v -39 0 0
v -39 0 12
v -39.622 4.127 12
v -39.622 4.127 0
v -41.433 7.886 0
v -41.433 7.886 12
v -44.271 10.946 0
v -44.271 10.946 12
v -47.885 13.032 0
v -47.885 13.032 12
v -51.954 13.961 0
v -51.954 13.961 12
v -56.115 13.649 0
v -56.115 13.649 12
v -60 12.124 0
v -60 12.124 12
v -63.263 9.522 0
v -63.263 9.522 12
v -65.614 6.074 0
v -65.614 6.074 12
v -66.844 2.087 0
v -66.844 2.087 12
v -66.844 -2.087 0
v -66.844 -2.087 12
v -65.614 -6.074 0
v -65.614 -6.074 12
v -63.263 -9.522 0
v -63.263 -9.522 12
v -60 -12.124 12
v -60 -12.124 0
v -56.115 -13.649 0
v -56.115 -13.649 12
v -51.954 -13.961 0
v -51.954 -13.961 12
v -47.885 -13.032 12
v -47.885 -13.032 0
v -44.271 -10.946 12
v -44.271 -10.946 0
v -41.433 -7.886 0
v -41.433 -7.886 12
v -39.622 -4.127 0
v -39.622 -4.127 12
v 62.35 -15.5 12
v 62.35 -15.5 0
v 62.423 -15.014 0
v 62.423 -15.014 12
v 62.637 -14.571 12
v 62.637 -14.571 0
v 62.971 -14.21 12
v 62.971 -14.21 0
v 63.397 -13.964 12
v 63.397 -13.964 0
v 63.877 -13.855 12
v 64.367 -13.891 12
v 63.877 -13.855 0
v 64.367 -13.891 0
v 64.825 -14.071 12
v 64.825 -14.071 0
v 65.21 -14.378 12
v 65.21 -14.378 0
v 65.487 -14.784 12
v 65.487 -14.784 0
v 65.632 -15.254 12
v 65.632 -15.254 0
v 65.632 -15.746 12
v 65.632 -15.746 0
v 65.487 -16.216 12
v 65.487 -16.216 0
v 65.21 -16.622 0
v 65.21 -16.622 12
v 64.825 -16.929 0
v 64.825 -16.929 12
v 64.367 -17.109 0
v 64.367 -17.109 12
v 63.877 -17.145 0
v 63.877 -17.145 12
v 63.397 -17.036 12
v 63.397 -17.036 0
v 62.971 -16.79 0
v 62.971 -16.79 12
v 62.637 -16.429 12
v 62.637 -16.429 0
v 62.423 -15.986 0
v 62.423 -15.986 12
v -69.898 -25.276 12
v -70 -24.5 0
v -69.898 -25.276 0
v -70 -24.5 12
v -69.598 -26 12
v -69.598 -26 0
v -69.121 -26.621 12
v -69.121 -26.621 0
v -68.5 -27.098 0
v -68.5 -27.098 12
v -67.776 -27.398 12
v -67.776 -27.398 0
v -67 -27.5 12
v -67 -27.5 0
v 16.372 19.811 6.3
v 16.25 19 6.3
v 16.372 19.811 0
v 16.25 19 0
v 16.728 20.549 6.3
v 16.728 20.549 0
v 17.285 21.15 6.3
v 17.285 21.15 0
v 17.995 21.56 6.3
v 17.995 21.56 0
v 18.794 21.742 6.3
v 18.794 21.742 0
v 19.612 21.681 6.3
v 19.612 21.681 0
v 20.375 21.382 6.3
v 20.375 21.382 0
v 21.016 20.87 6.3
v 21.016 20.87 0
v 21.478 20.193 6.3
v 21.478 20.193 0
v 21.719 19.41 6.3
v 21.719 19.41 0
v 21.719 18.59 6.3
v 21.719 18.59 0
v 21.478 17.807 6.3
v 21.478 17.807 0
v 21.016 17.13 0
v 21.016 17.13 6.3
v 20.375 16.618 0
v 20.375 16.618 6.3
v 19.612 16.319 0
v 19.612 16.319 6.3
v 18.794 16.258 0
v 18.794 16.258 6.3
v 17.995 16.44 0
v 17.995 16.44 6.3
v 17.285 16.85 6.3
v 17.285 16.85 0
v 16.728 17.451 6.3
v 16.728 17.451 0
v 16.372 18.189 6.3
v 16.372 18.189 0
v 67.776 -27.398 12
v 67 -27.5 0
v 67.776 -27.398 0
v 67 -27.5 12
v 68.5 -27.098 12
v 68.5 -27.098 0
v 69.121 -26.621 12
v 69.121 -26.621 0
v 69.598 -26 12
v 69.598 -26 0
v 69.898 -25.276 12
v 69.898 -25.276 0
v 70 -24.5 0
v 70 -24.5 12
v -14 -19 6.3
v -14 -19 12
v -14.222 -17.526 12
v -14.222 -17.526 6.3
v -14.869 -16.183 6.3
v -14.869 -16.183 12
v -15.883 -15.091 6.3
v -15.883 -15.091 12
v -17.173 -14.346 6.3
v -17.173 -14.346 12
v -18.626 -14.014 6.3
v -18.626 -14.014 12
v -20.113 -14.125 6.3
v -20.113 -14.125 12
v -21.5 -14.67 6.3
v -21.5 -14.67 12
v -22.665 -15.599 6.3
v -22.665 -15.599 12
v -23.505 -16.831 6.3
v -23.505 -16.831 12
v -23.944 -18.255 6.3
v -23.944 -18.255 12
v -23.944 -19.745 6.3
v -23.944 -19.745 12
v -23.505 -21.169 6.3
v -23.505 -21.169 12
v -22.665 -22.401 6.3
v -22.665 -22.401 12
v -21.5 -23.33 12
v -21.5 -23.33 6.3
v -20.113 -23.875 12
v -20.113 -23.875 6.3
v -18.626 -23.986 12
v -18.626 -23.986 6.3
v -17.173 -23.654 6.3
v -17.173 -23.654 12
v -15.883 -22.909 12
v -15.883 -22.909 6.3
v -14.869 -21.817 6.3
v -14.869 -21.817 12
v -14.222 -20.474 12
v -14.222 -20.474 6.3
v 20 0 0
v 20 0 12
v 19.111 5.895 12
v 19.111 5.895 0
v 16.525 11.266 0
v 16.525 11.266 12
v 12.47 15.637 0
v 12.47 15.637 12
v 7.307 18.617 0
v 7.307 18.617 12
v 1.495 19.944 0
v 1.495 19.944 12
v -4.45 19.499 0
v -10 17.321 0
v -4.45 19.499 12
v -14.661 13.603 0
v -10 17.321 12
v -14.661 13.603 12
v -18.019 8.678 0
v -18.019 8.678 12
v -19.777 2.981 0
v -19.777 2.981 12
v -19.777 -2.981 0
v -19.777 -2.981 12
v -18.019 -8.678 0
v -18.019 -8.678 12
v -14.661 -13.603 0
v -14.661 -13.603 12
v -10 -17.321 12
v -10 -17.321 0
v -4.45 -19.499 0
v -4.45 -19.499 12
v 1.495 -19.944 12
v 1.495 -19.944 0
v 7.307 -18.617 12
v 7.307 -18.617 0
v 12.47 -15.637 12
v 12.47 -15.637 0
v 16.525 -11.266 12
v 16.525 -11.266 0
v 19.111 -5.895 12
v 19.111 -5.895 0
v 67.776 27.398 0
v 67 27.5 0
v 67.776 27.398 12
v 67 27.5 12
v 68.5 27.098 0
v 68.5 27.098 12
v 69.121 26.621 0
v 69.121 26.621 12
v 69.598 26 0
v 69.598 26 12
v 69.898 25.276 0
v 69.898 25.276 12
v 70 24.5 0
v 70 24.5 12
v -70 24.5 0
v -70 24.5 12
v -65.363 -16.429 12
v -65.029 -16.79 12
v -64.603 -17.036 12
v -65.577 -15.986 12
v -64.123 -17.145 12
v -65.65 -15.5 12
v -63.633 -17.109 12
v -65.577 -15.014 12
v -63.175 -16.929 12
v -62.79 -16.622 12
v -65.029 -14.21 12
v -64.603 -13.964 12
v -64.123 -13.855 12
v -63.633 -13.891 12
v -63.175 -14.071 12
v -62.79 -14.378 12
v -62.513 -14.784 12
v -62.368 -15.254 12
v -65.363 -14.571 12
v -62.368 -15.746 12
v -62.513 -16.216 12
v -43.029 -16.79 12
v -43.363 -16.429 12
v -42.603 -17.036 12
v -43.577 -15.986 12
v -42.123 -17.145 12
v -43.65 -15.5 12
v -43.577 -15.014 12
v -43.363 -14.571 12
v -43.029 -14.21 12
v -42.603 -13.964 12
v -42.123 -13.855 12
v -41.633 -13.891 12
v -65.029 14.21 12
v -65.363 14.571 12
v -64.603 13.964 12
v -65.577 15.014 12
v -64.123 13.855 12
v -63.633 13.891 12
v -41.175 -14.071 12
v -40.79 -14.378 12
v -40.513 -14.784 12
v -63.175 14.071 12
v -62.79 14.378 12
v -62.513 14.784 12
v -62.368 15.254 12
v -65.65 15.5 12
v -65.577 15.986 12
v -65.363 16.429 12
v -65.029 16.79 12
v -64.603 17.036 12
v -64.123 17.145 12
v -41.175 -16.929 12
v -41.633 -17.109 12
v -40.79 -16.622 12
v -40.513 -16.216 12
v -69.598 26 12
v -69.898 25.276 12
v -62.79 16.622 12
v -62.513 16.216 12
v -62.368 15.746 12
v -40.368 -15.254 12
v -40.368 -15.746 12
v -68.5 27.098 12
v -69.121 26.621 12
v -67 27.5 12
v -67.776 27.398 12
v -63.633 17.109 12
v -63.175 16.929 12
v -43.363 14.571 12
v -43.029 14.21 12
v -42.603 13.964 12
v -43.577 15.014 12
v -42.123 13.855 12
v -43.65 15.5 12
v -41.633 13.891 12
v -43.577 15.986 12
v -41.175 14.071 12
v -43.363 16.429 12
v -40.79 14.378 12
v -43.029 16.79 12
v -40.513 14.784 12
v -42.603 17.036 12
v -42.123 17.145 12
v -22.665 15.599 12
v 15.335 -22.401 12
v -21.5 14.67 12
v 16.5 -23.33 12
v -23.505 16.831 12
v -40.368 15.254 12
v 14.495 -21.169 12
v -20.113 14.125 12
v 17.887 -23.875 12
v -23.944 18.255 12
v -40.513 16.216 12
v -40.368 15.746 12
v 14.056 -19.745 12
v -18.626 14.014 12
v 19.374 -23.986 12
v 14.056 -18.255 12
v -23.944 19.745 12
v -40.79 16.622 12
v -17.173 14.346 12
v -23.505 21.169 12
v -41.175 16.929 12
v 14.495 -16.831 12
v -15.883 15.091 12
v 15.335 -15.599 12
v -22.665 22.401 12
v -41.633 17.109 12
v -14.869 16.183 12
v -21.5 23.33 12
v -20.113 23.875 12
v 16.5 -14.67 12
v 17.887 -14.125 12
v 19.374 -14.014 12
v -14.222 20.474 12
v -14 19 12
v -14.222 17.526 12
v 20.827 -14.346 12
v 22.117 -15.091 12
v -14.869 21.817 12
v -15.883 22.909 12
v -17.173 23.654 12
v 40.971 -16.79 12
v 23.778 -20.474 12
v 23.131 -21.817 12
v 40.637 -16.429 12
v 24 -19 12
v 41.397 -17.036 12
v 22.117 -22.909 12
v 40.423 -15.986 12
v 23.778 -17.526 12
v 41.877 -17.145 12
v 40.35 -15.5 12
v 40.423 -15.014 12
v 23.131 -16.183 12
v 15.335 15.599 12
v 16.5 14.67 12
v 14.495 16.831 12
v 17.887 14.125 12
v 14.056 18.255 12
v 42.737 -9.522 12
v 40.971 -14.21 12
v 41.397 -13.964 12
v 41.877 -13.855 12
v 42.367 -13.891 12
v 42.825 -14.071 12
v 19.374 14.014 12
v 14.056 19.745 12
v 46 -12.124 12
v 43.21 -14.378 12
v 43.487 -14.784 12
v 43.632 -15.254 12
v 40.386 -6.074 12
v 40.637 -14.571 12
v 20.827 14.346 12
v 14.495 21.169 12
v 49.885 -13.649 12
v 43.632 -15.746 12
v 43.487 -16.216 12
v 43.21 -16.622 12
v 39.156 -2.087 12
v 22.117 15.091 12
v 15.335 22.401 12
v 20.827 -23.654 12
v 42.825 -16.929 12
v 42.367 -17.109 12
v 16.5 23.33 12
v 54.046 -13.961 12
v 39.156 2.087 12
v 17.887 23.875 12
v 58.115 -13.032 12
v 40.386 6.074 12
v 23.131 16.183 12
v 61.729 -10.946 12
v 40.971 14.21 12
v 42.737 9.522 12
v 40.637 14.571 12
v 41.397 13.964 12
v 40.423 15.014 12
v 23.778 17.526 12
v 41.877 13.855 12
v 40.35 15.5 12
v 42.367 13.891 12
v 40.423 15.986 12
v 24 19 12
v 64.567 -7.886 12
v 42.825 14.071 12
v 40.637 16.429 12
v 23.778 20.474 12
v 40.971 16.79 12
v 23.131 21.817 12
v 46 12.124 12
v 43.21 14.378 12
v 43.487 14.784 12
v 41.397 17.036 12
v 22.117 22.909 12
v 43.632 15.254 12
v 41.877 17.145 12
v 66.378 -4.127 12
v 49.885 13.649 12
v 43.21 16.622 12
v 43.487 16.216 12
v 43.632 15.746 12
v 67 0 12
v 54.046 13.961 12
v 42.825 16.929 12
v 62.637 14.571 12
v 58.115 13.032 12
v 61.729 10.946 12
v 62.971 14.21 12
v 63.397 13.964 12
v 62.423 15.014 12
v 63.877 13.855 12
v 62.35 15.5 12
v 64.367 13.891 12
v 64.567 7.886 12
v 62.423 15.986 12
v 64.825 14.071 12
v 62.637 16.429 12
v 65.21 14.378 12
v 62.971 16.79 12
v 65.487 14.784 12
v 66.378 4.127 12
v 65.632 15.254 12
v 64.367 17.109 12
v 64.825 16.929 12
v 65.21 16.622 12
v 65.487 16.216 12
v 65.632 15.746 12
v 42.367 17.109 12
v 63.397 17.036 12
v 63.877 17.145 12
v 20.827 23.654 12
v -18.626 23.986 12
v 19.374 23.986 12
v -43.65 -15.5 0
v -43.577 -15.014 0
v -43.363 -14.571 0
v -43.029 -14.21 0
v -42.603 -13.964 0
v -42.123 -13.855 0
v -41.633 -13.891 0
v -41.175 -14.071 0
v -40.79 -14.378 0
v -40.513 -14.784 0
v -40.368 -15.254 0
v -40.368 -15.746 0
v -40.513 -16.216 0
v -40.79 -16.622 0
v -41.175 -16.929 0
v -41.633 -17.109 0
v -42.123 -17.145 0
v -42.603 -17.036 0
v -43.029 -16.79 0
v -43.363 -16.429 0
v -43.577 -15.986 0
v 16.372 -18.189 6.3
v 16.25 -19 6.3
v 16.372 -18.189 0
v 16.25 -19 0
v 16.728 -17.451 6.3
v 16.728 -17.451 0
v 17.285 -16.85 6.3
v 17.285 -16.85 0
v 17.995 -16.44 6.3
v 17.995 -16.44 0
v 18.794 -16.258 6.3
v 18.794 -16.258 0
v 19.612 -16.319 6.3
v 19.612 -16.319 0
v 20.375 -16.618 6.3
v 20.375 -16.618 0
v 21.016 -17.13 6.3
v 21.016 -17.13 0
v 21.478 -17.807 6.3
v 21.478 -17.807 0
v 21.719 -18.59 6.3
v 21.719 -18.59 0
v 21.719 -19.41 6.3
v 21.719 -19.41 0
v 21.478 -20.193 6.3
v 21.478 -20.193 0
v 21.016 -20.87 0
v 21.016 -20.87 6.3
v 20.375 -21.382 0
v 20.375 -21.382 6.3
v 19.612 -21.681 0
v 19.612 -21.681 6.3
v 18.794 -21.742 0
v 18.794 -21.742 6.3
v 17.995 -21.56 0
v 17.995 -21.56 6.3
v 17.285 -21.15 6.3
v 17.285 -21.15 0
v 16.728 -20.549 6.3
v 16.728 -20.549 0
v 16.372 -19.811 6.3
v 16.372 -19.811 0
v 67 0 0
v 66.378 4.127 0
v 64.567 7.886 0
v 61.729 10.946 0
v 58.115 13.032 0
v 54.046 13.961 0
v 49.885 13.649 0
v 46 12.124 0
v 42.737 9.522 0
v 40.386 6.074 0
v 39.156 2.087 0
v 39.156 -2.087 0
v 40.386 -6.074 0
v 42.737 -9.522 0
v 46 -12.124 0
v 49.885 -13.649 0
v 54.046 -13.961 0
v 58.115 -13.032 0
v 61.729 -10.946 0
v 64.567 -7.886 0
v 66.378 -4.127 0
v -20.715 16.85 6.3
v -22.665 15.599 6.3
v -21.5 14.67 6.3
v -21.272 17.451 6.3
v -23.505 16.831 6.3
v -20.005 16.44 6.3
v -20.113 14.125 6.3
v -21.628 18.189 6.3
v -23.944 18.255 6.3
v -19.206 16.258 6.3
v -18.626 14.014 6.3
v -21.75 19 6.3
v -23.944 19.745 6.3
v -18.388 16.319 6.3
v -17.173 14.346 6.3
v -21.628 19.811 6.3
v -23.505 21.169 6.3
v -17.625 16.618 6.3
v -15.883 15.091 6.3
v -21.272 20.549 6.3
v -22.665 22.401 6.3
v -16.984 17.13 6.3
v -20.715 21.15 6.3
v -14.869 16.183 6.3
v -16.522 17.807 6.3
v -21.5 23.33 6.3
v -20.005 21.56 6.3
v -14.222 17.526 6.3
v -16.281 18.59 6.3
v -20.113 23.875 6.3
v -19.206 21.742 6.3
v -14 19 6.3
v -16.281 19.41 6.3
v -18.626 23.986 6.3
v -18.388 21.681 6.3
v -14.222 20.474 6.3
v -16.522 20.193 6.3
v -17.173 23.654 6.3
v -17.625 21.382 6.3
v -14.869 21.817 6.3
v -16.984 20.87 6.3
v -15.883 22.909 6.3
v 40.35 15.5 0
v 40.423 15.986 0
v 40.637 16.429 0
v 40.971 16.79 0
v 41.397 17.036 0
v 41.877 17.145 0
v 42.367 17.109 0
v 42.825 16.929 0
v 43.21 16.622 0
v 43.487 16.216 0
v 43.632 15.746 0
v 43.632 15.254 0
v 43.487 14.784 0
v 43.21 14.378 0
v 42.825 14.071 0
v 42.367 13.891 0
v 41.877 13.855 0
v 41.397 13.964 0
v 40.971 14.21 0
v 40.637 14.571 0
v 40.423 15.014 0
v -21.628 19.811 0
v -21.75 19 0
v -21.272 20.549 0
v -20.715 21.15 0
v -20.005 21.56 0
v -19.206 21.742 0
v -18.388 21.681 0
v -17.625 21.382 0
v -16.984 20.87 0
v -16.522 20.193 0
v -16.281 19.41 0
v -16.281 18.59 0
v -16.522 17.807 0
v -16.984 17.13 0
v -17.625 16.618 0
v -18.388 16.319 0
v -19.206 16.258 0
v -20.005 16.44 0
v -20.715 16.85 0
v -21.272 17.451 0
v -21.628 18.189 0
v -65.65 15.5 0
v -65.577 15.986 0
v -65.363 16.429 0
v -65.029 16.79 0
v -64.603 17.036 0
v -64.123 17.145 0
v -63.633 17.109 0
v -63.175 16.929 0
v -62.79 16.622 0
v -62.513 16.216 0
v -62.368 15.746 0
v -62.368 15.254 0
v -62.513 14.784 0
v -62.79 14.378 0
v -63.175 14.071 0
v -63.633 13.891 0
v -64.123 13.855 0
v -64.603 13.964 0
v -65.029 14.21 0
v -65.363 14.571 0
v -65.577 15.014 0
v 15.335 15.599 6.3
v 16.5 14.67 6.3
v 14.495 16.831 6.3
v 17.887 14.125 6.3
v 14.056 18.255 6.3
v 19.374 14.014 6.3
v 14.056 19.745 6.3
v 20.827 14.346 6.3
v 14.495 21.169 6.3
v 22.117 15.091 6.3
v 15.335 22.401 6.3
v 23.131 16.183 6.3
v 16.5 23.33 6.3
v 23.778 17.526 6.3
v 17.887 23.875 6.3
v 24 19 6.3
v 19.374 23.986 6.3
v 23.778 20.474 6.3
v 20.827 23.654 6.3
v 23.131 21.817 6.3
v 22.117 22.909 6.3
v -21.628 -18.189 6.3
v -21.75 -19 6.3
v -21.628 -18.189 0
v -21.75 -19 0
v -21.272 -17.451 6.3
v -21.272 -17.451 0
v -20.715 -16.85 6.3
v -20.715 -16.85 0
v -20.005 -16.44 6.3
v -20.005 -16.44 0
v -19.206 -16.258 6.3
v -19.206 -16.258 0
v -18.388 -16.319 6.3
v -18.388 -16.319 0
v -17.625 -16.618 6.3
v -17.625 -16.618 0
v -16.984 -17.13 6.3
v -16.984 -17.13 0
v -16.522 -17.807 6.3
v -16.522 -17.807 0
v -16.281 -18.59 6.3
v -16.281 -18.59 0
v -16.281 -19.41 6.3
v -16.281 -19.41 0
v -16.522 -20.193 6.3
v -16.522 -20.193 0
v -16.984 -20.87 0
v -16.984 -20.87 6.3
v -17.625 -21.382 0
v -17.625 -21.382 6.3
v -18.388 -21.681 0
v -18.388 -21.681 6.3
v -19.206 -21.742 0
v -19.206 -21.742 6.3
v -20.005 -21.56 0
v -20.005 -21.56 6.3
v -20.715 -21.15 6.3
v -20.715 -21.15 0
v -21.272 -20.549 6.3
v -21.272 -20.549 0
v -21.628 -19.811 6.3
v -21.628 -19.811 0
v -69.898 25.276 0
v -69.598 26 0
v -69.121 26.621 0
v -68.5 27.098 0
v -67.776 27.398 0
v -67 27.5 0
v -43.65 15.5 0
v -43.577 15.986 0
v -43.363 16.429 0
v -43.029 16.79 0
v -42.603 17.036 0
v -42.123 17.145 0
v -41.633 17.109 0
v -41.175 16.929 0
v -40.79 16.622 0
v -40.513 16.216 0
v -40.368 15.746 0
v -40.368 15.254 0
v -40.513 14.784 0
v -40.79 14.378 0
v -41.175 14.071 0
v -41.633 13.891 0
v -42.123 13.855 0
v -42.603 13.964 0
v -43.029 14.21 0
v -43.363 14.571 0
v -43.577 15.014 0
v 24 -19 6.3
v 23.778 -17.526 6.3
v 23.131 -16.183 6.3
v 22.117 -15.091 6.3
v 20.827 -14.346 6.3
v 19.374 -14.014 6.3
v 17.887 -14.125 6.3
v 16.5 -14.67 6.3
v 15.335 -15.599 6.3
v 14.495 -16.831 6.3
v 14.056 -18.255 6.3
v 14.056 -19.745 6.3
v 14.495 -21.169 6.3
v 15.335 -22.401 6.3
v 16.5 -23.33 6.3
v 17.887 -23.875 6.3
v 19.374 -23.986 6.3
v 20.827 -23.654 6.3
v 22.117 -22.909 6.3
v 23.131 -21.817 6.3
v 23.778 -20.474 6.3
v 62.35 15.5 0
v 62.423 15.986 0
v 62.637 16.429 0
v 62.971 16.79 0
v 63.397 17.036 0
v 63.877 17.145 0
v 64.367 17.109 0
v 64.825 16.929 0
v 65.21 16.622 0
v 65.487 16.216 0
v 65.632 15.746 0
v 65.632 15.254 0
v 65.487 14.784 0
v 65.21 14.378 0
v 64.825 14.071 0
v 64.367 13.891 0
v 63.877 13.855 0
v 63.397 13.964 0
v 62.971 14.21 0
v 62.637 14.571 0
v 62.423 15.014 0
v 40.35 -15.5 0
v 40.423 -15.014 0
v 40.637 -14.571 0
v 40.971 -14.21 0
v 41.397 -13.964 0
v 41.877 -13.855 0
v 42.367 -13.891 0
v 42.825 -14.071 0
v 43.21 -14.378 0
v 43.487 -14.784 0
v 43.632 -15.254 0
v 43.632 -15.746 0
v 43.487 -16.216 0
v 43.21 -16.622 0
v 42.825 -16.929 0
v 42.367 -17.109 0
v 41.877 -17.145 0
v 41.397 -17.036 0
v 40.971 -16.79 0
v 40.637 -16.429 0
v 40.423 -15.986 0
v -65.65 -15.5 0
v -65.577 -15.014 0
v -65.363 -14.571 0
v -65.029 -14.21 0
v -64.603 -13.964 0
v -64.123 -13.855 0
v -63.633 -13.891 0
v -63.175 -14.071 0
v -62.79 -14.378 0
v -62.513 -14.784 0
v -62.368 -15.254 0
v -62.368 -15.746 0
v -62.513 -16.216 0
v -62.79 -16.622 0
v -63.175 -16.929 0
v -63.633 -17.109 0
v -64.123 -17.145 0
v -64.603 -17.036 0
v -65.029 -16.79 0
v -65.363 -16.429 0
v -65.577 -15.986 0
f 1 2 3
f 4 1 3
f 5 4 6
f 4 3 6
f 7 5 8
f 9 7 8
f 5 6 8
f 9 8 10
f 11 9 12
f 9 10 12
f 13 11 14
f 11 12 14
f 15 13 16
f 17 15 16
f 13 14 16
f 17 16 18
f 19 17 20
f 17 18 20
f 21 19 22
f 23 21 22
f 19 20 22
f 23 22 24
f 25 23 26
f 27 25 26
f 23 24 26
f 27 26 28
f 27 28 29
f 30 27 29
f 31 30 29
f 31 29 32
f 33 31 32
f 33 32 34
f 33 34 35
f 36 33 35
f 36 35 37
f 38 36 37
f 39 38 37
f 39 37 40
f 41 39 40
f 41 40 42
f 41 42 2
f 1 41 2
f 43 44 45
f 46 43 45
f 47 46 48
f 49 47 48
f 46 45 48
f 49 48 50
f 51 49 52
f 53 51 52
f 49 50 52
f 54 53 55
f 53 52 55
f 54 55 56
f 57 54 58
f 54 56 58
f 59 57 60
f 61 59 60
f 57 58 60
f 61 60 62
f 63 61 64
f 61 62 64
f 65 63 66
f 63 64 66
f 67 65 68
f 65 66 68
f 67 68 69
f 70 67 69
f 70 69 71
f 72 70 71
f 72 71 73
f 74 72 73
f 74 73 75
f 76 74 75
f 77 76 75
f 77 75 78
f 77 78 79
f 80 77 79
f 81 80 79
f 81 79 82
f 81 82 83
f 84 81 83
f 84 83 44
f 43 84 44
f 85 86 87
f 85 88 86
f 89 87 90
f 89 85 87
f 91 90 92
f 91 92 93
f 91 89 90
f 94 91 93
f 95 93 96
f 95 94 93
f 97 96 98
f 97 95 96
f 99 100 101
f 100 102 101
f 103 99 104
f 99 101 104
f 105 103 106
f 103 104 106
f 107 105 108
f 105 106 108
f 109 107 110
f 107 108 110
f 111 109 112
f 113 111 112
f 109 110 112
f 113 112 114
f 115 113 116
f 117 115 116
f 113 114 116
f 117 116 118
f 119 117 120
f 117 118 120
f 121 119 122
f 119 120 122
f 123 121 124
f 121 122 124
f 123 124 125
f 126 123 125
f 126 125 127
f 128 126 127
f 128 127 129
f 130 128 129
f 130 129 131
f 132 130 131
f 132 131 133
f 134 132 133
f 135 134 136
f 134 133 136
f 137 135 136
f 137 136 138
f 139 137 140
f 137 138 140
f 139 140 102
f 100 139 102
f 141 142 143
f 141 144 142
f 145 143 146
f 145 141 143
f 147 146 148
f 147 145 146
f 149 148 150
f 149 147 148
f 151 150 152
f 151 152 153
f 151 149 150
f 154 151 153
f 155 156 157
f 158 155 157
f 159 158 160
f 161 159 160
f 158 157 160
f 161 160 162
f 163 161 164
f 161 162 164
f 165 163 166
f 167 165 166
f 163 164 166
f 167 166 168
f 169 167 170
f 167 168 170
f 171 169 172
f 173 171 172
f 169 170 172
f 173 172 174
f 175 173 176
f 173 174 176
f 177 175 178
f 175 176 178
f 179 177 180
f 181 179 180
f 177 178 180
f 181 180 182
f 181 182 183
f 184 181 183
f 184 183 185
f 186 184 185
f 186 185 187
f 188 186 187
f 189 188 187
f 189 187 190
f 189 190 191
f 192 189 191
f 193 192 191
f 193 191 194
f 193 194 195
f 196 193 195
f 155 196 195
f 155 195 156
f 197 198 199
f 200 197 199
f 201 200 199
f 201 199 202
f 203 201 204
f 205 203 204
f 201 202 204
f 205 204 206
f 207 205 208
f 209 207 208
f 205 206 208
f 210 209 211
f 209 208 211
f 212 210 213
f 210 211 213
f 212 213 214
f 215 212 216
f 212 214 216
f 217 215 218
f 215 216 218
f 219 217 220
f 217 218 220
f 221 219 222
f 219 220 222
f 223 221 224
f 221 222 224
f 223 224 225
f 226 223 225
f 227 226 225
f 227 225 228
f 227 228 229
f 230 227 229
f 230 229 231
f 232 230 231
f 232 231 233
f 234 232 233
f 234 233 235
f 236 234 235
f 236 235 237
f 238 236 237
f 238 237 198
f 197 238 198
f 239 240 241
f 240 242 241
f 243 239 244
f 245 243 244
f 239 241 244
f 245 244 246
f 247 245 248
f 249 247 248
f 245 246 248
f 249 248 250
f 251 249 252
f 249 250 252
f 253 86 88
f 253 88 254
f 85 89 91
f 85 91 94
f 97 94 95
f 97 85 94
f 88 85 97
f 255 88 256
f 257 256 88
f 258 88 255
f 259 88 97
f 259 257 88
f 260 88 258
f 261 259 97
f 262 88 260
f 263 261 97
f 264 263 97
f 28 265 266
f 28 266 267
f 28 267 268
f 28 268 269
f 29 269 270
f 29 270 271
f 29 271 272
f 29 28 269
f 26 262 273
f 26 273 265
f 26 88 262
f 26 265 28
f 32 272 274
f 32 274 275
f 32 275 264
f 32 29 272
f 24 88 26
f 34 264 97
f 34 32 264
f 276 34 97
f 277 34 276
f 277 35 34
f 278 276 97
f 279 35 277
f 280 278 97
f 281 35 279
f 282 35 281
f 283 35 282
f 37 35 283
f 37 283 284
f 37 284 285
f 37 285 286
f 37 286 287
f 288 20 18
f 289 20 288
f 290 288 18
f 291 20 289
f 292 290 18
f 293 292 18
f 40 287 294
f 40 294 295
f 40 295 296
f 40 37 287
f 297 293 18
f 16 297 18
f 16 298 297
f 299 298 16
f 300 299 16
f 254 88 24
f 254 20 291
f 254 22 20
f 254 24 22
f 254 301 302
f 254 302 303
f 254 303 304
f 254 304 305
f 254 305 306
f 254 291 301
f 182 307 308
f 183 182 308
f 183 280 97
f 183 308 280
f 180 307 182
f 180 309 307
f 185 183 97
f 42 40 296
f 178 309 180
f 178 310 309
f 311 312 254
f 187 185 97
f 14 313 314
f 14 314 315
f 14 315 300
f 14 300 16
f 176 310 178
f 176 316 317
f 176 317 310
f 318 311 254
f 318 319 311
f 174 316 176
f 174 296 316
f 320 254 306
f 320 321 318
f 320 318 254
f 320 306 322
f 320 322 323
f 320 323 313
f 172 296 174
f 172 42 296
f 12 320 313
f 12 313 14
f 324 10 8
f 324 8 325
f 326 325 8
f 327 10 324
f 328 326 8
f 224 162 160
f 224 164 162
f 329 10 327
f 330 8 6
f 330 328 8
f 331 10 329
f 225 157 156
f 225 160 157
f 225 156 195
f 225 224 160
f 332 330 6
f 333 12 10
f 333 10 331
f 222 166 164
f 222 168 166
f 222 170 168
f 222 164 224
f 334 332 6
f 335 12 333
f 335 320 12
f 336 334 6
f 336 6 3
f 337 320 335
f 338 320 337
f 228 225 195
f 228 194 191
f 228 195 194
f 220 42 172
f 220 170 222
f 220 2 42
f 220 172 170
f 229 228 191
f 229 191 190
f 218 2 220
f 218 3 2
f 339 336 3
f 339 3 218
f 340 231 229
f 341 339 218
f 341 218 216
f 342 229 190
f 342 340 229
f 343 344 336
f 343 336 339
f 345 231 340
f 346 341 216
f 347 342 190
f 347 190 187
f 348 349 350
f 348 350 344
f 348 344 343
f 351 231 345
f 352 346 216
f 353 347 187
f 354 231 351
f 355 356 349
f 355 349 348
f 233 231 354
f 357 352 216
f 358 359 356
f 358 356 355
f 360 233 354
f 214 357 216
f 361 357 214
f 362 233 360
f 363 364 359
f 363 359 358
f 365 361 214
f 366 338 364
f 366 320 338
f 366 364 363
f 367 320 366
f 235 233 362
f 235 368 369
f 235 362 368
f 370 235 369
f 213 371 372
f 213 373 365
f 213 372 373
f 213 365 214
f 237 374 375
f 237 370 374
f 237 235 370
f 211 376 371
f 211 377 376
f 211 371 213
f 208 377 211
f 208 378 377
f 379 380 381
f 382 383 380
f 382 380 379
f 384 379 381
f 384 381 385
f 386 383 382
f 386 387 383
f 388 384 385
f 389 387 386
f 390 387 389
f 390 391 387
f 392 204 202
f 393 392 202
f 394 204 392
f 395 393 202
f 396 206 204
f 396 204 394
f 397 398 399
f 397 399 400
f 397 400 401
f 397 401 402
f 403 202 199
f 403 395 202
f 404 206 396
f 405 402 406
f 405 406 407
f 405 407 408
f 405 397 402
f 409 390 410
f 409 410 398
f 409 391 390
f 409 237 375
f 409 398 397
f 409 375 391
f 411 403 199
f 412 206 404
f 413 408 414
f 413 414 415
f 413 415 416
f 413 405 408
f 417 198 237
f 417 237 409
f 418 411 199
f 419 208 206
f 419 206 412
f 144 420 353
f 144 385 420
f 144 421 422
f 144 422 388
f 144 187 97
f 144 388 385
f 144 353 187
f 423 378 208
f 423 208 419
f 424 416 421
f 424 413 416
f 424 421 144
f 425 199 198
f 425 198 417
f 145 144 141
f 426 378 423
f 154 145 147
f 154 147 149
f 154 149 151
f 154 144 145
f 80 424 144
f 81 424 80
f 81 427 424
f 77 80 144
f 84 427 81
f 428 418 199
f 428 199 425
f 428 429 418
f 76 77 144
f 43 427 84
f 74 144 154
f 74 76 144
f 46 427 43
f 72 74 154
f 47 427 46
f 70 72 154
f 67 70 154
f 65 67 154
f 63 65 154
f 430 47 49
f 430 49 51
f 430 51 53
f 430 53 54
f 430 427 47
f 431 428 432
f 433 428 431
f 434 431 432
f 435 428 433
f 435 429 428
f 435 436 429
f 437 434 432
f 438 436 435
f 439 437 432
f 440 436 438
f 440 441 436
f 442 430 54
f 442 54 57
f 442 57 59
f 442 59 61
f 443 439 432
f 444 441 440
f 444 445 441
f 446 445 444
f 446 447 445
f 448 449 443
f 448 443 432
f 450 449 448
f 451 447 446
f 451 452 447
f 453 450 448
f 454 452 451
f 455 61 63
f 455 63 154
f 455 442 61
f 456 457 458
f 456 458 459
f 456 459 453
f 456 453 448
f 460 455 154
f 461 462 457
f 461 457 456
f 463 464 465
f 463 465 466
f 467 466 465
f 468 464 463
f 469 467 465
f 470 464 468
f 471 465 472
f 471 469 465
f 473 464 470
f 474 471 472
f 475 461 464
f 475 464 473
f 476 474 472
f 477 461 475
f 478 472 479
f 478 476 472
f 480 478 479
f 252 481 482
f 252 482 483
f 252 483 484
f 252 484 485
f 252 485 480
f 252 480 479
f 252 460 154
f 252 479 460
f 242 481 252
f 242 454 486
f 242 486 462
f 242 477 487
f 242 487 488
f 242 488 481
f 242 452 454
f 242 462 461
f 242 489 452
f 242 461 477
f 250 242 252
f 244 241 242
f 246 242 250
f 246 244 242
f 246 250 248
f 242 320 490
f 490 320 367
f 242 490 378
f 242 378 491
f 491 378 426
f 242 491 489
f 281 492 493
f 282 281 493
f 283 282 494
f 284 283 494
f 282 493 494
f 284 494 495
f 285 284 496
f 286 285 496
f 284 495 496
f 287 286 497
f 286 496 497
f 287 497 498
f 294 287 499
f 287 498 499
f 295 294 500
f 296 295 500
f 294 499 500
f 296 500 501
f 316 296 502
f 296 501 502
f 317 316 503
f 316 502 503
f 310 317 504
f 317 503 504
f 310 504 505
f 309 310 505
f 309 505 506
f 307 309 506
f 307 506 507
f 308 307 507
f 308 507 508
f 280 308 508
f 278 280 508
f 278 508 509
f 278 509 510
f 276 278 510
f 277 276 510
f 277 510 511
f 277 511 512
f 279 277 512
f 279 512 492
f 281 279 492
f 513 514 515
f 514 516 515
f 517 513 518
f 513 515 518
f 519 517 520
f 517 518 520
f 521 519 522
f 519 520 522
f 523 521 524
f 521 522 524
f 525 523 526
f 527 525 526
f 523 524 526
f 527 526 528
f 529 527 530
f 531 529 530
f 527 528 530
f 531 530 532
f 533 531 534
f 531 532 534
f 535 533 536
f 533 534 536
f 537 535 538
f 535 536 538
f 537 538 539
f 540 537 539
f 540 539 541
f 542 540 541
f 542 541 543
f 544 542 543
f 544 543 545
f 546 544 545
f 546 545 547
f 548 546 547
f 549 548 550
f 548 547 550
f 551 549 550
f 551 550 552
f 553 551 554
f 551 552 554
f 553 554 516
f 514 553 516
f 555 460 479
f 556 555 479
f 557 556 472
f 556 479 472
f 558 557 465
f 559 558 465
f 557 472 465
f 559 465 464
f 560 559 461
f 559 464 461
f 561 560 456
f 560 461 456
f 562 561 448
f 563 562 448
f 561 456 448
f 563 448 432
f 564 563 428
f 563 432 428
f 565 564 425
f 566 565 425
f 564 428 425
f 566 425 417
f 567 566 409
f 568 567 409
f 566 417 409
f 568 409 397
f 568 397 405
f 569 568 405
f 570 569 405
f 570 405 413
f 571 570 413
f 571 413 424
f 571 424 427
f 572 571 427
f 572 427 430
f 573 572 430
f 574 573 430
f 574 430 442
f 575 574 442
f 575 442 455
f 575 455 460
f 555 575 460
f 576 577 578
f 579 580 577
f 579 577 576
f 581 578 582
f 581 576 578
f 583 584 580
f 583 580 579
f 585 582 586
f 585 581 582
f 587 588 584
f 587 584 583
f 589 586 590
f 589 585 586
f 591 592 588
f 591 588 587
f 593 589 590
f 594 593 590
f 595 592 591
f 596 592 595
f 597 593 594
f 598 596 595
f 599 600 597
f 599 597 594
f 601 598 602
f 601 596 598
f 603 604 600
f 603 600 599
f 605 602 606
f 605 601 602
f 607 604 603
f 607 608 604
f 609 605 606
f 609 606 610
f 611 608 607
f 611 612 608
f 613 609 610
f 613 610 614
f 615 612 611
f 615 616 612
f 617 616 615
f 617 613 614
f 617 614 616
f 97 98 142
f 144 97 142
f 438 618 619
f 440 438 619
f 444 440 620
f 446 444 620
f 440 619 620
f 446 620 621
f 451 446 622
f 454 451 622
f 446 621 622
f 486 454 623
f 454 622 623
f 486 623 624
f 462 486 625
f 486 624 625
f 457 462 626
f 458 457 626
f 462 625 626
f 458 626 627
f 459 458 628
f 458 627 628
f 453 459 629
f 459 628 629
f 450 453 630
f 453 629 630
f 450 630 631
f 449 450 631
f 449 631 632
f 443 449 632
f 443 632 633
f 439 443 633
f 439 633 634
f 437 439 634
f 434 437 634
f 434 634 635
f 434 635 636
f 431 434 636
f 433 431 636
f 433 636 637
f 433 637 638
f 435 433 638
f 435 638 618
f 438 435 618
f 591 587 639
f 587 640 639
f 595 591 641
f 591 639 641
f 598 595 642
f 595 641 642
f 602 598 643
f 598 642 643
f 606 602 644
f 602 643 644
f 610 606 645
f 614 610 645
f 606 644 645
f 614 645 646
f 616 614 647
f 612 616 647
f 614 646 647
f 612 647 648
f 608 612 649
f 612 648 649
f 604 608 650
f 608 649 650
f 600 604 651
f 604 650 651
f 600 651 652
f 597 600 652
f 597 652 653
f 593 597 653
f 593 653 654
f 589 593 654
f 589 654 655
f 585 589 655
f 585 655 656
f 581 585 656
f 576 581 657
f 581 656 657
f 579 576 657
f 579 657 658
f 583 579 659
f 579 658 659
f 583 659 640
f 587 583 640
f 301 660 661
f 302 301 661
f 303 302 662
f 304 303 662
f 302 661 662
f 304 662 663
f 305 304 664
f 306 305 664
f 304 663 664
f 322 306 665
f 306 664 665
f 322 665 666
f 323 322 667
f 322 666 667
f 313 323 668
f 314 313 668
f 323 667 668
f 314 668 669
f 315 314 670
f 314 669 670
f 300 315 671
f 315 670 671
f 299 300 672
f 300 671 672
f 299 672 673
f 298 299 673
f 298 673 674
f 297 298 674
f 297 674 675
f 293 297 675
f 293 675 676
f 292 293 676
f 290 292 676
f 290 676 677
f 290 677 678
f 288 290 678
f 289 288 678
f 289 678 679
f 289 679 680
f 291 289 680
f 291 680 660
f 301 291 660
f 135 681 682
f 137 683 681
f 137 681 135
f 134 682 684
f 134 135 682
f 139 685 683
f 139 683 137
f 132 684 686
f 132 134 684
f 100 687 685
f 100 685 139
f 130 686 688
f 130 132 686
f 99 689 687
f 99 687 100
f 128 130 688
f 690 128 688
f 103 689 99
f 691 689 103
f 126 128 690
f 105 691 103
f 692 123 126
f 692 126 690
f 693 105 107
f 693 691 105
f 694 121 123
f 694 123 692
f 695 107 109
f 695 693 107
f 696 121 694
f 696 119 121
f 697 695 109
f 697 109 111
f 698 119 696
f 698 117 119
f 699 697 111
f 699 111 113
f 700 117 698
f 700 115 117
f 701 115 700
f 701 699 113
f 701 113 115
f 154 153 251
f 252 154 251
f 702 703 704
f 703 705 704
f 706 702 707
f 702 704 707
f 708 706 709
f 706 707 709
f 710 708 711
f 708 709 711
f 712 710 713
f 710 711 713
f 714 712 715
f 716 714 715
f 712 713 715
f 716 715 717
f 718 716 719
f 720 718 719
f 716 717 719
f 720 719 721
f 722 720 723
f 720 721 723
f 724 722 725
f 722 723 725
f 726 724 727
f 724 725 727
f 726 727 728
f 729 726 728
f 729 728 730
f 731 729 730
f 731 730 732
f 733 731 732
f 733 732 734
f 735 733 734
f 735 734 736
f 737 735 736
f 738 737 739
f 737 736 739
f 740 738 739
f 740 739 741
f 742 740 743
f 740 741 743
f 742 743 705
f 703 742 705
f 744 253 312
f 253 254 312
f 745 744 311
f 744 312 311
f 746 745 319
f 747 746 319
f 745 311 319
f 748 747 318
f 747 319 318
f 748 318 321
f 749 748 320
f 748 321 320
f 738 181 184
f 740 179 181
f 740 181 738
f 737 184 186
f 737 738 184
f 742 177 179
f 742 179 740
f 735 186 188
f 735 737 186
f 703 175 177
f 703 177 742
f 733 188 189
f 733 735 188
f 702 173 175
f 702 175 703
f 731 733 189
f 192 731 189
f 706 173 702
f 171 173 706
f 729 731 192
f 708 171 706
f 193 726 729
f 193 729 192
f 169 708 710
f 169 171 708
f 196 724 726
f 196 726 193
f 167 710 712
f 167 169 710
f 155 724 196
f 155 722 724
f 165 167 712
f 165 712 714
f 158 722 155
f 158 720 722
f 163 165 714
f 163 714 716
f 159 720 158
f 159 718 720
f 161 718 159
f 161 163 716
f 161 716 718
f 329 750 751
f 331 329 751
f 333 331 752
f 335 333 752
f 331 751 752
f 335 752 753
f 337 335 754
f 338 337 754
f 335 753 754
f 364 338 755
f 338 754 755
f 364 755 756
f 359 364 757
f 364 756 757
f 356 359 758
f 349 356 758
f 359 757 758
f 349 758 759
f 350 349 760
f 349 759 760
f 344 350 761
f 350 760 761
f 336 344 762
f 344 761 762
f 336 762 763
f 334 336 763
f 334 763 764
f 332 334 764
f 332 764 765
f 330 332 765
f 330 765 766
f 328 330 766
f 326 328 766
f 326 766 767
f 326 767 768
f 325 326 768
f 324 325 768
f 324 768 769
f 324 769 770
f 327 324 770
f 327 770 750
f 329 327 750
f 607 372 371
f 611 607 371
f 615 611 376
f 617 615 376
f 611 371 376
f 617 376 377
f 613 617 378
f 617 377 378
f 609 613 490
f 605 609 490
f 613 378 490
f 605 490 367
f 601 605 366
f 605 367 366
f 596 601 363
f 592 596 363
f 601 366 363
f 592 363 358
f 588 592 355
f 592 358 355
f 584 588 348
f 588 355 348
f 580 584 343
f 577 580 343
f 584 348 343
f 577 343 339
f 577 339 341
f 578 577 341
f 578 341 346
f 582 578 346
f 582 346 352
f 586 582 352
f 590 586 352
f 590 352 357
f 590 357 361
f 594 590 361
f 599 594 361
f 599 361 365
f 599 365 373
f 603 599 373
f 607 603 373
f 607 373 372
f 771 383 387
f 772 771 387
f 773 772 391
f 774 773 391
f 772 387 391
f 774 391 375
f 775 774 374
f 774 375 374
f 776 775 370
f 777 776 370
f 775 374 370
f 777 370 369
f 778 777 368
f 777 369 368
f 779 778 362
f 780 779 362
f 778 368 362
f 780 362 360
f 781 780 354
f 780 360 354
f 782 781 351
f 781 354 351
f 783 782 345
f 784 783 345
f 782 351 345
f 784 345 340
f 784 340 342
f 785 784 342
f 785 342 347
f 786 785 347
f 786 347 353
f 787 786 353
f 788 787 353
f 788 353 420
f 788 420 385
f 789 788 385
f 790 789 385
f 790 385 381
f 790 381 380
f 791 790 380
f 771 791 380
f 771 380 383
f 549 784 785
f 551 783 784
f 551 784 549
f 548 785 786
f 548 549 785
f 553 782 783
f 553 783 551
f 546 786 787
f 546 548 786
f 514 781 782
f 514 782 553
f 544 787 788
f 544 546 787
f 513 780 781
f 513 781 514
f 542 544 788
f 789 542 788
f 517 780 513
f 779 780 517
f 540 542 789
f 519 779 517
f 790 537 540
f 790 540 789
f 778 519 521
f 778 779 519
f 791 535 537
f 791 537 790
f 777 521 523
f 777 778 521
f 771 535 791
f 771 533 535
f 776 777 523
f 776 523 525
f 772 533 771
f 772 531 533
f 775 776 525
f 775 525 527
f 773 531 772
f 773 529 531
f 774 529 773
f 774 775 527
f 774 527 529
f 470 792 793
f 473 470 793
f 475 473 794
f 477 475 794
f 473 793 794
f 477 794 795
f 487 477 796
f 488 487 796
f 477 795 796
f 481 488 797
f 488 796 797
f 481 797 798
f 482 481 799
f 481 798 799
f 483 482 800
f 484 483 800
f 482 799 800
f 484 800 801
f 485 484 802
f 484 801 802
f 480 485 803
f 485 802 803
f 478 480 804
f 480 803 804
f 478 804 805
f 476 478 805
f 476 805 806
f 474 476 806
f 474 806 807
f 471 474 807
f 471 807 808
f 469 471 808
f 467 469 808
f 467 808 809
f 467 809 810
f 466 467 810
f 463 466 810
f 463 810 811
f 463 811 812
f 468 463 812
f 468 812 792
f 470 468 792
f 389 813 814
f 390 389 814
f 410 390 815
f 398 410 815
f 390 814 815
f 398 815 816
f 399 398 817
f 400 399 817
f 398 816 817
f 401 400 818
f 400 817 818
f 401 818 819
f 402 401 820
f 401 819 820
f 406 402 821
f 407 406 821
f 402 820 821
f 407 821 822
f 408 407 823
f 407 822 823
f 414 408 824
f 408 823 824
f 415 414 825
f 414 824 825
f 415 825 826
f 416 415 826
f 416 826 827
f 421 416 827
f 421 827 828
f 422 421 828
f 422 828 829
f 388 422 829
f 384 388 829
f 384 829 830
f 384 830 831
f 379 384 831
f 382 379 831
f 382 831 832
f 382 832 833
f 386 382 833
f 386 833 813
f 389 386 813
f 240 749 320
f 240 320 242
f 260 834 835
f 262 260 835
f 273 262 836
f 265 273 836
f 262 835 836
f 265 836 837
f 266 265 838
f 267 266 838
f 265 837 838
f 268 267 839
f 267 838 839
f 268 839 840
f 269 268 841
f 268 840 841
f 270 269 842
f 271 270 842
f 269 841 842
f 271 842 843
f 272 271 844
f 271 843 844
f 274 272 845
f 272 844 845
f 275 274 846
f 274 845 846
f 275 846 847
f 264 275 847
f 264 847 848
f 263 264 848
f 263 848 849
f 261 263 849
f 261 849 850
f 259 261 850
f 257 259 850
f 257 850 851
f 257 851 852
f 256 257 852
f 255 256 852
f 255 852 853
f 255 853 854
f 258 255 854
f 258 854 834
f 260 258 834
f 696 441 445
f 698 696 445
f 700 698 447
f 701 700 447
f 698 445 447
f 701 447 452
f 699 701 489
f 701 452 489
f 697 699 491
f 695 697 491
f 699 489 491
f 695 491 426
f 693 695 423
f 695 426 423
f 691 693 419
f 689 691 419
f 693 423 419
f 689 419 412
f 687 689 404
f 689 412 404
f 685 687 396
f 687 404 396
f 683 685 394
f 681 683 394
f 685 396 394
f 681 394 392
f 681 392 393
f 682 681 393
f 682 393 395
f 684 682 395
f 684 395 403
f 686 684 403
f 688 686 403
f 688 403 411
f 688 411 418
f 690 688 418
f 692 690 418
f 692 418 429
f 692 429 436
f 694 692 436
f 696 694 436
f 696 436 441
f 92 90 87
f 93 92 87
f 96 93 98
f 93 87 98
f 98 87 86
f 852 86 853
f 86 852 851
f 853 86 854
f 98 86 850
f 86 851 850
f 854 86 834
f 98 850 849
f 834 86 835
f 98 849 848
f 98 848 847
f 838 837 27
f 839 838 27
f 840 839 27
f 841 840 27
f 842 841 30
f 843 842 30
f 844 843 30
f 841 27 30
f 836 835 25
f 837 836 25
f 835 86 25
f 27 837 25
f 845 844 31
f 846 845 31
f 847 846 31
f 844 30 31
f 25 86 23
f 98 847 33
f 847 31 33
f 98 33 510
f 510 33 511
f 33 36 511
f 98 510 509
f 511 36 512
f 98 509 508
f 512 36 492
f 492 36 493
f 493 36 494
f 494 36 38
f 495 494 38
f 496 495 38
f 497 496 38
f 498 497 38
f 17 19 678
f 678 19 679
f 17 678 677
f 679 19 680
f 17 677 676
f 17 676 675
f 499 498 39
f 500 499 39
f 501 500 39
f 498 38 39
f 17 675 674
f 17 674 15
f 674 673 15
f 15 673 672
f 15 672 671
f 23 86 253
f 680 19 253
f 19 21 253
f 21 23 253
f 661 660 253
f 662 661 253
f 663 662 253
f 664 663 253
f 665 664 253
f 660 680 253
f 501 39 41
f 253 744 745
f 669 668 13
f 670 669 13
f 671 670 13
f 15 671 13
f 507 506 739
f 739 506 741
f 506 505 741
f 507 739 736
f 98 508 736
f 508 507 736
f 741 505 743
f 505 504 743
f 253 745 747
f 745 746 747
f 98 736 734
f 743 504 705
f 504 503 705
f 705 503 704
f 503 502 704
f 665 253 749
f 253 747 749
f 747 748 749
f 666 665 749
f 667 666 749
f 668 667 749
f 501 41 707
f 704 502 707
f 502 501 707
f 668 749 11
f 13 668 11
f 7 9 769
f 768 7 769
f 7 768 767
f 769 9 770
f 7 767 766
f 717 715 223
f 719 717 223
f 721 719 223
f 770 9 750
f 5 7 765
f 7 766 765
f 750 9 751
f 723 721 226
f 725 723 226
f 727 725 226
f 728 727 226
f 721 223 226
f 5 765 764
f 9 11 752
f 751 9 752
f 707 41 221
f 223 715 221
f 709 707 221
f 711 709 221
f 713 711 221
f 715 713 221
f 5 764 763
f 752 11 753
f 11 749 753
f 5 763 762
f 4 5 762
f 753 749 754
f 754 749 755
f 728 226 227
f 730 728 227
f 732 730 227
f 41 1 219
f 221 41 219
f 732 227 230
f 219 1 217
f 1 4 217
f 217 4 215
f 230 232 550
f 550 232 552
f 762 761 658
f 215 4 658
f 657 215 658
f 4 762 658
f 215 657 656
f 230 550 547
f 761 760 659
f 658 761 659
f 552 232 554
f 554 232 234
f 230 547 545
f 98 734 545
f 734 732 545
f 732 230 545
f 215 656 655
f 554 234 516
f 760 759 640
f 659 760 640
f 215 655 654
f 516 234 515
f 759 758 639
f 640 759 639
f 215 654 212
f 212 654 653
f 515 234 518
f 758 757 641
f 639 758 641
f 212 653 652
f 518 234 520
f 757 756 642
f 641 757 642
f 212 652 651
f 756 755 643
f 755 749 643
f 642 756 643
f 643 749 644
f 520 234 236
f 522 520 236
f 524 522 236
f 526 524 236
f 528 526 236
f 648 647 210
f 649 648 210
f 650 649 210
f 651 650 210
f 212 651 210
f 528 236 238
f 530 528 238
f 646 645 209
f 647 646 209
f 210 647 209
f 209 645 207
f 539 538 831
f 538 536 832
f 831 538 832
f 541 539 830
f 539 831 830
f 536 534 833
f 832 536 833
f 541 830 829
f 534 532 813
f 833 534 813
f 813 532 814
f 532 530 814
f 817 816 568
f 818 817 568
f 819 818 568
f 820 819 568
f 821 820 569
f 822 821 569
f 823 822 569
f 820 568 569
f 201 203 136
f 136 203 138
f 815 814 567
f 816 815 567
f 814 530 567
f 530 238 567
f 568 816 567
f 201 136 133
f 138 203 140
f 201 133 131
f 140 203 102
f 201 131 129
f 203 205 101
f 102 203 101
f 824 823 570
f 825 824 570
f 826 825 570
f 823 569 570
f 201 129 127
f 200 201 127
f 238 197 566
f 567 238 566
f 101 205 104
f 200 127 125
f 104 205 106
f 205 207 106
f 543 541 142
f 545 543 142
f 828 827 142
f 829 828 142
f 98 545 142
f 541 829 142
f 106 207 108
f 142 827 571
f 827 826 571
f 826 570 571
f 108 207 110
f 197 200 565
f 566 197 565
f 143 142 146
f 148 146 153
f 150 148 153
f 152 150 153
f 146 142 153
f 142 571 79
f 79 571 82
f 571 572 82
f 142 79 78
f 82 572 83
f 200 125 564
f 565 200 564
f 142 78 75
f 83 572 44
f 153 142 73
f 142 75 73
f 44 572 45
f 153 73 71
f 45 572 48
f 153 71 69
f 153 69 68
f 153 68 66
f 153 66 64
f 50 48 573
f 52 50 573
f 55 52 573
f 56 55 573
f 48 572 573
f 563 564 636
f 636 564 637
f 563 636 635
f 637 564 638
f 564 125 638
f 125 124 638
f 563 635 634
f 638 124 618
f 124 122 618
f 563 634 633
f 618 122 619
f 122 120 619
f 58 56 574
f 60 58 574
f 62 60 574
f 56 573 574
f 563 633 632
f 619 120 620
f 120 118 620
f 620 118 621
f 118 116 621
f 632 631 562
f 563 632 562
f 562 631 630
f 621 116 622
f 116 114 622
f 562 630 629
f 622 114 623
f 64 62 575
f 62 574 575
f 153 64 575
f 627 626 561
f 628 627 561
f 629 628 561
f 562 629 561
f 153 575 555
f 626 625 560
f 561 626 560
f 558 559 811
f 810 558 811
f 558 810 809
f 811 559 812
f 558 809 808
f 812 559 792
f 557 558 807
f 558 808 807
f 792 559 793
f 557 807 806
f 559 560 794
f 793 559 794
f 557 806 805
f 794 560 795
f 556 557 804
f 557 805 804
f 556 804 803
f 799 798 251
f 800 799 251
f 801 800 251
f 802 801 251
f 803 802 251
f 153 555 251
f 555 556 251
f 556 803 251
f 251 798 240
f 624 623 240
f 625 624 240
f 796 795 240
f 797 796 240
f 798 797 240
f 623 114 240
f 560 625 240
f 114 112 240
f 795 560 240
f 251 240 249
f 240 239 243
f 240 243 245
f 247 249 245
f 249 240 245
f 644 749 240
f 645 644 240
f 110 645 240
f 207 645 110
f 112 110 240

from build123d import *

# Parameters (mm, degrees)
SKETCH_1_W                = 140
SKETCH_1_H                = 55
EXTRUDE_1_DEPTH           = 12
SKETCH_2_R                = 20
SKETCH_2_R_2              = 14
CUT_EXTRUDE_1_DEPTH       = 77.159372371
FILLET_1_R                = 3
HOLE_WIZARD_M4_1_D        = 3.3
HOLE_WIZARD_1_D           = 5.5
HOLE_WIZARD_1_CBORE_D     = 10
HOLE_WIZARD_1_CBORE_DEPTH = 5.7


with BuildPart() as part:
    # 草图1 → 凸台-拉伸1 (new body)
    with BuildSketch(Plane.XY):
        Rectangle(SKETCH_1_W, SKETCH_1_H)
    extrude(amount=EXTRUDE_1_DEPTH)

    # 草图2 → 切除-拉伸1 (cut, through all)
    with BuildSketch(Plane.XY.offset(12)):
        Circle(SKETCH_2_R)
        with Locations((-53, 0)):
            Circle(SKETCH_2_R_2)
        with Locations((53, 0)):
            Circle(SKETCH_2_R_2)
    extrude(amount=-CUT_EXTRUDE_1_DEPTH, mode=Mode.SUBTRACT)

    # 圆角1
    fillet_1_edges = [part.edges().sort_by_distance(p)[0] for p in [
        (70, -27.5, 6),
        (-70, -27.5, 6),
        (-70, 27.5, 6),
        (70, 27.5, 6),
    ]]
    fillet(fillet_1_edges, radius=FILLET_1_R)

    # M4 螺纹孔1 (through all)
    with Locations(Plane.XY.offset(12)):
        with Locations((-64, 15.5), (-42, 15.5), (-42, -15.5), (-64, -15.5), (42, -15.5), (64, -15.5), (64, 15.5), (42, 15.5)):
            Hole(HOLE_WIZARD_M4_1_D / 2)

    # 打孔尺寸(%根据)内六角圆柱头螺钉的类型1 (through all)
    with Locations(Plane.XY.offset(12)):
        with Locations((-19, 19), (19, 19), (19, -19), (-19, -19)):
            CounterBoreHole(HOLE_WIZARD_1_D / 2, HOLE_WIZARD_1_CBORE_D / 2, HOLE_WIZARD_1_CBORE_DEPTH)


solid = part.part
